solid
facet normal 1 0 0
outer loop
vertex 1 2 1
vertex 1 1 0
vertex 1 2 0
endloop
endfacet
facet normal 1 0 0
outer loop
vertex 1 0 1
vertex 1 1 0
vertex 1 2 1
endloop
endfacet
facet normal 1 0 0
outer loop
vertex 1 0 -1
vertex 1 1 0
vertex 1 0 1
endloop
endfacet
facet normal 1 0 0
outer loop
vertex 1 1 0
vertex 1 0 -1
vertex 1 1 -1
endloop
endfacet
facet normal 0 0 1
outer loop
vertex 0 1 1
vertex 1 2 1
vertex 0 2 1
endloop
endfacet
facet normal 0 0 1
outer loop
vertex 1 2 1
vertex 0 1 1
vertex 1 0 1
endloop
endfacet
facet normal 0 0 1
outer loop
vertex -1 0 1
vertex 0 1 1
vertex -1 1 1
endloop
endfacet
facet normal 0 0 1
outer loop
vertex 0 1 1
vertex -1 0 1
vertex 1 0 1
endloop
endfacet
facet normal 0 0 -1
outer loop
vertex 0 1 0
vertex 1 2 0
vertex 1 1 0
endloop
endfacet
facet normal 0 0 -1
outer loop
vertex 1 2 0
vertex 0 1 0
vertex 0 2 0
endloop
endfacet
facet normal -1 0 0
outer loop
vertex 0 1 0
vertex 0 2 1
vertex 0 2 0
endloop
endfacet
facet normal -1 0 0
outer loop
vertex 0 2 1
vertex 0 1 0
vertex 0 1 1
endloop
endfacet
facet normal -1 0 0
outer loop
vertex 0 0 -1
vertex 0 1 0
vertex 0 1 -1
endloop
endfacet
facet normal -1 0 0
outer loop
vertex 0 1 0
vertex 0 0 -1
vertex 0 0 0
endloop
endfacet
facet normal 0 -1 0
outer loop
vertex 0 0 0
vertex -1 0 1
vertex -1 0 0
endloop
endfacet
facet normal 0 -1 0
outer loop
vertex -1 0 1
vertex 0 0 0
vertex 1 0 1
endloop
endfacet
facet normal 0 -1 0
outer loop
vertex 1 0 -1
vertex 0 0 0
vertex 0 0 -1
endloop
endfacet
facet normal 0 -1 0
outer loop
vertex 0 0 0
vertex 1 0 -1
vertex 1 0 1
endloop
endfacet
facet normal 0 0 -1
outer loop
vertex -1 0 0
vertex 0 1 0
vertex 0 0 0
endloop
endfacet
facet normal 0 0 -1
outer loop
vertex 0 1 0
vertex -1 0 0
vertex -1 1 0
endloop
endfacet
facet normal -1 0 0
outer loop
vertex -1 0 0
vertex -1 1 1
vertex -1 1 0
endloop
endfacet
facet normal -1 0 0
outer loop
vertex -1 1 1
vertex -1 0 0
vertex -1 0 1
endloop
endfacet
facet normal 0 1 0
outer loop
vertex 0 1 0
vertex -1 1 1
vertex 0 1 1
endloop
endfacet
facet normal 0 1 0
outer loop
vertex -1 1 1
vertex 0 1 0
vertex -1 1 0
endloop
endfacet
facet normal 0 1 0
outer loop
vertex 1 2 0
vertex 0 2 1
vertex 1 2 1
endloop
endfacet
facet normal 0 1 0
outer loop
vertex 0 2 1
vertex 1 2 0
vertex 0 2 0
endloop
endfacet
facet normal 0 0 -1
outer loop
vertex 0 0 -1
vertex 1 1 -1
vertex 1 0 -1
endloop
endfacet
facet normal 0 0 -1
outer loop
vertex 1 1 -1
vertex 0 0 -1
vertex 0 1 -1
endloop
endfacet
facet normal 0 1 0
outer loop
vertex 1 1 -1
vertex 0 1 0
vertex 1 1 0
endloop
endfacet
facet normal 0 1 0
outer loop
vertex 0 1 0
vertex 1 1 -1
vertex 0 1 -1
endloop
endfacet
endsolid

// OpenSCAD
/**
Model coded by @ken4rab
With licence cc-by-sa 4.0

https://creativecommons.org/licenses/by-sa/4.0/
*/
union() {
cube(1,1,1);    
color("blue")translate([-1,0,0])cube(size = [1,1,1]);
color("red")translate([0,1,0])cube(size = [1,1,1]);
color("yellow")translate([0,0,-1])cube(size = [1,1,1]);
}
